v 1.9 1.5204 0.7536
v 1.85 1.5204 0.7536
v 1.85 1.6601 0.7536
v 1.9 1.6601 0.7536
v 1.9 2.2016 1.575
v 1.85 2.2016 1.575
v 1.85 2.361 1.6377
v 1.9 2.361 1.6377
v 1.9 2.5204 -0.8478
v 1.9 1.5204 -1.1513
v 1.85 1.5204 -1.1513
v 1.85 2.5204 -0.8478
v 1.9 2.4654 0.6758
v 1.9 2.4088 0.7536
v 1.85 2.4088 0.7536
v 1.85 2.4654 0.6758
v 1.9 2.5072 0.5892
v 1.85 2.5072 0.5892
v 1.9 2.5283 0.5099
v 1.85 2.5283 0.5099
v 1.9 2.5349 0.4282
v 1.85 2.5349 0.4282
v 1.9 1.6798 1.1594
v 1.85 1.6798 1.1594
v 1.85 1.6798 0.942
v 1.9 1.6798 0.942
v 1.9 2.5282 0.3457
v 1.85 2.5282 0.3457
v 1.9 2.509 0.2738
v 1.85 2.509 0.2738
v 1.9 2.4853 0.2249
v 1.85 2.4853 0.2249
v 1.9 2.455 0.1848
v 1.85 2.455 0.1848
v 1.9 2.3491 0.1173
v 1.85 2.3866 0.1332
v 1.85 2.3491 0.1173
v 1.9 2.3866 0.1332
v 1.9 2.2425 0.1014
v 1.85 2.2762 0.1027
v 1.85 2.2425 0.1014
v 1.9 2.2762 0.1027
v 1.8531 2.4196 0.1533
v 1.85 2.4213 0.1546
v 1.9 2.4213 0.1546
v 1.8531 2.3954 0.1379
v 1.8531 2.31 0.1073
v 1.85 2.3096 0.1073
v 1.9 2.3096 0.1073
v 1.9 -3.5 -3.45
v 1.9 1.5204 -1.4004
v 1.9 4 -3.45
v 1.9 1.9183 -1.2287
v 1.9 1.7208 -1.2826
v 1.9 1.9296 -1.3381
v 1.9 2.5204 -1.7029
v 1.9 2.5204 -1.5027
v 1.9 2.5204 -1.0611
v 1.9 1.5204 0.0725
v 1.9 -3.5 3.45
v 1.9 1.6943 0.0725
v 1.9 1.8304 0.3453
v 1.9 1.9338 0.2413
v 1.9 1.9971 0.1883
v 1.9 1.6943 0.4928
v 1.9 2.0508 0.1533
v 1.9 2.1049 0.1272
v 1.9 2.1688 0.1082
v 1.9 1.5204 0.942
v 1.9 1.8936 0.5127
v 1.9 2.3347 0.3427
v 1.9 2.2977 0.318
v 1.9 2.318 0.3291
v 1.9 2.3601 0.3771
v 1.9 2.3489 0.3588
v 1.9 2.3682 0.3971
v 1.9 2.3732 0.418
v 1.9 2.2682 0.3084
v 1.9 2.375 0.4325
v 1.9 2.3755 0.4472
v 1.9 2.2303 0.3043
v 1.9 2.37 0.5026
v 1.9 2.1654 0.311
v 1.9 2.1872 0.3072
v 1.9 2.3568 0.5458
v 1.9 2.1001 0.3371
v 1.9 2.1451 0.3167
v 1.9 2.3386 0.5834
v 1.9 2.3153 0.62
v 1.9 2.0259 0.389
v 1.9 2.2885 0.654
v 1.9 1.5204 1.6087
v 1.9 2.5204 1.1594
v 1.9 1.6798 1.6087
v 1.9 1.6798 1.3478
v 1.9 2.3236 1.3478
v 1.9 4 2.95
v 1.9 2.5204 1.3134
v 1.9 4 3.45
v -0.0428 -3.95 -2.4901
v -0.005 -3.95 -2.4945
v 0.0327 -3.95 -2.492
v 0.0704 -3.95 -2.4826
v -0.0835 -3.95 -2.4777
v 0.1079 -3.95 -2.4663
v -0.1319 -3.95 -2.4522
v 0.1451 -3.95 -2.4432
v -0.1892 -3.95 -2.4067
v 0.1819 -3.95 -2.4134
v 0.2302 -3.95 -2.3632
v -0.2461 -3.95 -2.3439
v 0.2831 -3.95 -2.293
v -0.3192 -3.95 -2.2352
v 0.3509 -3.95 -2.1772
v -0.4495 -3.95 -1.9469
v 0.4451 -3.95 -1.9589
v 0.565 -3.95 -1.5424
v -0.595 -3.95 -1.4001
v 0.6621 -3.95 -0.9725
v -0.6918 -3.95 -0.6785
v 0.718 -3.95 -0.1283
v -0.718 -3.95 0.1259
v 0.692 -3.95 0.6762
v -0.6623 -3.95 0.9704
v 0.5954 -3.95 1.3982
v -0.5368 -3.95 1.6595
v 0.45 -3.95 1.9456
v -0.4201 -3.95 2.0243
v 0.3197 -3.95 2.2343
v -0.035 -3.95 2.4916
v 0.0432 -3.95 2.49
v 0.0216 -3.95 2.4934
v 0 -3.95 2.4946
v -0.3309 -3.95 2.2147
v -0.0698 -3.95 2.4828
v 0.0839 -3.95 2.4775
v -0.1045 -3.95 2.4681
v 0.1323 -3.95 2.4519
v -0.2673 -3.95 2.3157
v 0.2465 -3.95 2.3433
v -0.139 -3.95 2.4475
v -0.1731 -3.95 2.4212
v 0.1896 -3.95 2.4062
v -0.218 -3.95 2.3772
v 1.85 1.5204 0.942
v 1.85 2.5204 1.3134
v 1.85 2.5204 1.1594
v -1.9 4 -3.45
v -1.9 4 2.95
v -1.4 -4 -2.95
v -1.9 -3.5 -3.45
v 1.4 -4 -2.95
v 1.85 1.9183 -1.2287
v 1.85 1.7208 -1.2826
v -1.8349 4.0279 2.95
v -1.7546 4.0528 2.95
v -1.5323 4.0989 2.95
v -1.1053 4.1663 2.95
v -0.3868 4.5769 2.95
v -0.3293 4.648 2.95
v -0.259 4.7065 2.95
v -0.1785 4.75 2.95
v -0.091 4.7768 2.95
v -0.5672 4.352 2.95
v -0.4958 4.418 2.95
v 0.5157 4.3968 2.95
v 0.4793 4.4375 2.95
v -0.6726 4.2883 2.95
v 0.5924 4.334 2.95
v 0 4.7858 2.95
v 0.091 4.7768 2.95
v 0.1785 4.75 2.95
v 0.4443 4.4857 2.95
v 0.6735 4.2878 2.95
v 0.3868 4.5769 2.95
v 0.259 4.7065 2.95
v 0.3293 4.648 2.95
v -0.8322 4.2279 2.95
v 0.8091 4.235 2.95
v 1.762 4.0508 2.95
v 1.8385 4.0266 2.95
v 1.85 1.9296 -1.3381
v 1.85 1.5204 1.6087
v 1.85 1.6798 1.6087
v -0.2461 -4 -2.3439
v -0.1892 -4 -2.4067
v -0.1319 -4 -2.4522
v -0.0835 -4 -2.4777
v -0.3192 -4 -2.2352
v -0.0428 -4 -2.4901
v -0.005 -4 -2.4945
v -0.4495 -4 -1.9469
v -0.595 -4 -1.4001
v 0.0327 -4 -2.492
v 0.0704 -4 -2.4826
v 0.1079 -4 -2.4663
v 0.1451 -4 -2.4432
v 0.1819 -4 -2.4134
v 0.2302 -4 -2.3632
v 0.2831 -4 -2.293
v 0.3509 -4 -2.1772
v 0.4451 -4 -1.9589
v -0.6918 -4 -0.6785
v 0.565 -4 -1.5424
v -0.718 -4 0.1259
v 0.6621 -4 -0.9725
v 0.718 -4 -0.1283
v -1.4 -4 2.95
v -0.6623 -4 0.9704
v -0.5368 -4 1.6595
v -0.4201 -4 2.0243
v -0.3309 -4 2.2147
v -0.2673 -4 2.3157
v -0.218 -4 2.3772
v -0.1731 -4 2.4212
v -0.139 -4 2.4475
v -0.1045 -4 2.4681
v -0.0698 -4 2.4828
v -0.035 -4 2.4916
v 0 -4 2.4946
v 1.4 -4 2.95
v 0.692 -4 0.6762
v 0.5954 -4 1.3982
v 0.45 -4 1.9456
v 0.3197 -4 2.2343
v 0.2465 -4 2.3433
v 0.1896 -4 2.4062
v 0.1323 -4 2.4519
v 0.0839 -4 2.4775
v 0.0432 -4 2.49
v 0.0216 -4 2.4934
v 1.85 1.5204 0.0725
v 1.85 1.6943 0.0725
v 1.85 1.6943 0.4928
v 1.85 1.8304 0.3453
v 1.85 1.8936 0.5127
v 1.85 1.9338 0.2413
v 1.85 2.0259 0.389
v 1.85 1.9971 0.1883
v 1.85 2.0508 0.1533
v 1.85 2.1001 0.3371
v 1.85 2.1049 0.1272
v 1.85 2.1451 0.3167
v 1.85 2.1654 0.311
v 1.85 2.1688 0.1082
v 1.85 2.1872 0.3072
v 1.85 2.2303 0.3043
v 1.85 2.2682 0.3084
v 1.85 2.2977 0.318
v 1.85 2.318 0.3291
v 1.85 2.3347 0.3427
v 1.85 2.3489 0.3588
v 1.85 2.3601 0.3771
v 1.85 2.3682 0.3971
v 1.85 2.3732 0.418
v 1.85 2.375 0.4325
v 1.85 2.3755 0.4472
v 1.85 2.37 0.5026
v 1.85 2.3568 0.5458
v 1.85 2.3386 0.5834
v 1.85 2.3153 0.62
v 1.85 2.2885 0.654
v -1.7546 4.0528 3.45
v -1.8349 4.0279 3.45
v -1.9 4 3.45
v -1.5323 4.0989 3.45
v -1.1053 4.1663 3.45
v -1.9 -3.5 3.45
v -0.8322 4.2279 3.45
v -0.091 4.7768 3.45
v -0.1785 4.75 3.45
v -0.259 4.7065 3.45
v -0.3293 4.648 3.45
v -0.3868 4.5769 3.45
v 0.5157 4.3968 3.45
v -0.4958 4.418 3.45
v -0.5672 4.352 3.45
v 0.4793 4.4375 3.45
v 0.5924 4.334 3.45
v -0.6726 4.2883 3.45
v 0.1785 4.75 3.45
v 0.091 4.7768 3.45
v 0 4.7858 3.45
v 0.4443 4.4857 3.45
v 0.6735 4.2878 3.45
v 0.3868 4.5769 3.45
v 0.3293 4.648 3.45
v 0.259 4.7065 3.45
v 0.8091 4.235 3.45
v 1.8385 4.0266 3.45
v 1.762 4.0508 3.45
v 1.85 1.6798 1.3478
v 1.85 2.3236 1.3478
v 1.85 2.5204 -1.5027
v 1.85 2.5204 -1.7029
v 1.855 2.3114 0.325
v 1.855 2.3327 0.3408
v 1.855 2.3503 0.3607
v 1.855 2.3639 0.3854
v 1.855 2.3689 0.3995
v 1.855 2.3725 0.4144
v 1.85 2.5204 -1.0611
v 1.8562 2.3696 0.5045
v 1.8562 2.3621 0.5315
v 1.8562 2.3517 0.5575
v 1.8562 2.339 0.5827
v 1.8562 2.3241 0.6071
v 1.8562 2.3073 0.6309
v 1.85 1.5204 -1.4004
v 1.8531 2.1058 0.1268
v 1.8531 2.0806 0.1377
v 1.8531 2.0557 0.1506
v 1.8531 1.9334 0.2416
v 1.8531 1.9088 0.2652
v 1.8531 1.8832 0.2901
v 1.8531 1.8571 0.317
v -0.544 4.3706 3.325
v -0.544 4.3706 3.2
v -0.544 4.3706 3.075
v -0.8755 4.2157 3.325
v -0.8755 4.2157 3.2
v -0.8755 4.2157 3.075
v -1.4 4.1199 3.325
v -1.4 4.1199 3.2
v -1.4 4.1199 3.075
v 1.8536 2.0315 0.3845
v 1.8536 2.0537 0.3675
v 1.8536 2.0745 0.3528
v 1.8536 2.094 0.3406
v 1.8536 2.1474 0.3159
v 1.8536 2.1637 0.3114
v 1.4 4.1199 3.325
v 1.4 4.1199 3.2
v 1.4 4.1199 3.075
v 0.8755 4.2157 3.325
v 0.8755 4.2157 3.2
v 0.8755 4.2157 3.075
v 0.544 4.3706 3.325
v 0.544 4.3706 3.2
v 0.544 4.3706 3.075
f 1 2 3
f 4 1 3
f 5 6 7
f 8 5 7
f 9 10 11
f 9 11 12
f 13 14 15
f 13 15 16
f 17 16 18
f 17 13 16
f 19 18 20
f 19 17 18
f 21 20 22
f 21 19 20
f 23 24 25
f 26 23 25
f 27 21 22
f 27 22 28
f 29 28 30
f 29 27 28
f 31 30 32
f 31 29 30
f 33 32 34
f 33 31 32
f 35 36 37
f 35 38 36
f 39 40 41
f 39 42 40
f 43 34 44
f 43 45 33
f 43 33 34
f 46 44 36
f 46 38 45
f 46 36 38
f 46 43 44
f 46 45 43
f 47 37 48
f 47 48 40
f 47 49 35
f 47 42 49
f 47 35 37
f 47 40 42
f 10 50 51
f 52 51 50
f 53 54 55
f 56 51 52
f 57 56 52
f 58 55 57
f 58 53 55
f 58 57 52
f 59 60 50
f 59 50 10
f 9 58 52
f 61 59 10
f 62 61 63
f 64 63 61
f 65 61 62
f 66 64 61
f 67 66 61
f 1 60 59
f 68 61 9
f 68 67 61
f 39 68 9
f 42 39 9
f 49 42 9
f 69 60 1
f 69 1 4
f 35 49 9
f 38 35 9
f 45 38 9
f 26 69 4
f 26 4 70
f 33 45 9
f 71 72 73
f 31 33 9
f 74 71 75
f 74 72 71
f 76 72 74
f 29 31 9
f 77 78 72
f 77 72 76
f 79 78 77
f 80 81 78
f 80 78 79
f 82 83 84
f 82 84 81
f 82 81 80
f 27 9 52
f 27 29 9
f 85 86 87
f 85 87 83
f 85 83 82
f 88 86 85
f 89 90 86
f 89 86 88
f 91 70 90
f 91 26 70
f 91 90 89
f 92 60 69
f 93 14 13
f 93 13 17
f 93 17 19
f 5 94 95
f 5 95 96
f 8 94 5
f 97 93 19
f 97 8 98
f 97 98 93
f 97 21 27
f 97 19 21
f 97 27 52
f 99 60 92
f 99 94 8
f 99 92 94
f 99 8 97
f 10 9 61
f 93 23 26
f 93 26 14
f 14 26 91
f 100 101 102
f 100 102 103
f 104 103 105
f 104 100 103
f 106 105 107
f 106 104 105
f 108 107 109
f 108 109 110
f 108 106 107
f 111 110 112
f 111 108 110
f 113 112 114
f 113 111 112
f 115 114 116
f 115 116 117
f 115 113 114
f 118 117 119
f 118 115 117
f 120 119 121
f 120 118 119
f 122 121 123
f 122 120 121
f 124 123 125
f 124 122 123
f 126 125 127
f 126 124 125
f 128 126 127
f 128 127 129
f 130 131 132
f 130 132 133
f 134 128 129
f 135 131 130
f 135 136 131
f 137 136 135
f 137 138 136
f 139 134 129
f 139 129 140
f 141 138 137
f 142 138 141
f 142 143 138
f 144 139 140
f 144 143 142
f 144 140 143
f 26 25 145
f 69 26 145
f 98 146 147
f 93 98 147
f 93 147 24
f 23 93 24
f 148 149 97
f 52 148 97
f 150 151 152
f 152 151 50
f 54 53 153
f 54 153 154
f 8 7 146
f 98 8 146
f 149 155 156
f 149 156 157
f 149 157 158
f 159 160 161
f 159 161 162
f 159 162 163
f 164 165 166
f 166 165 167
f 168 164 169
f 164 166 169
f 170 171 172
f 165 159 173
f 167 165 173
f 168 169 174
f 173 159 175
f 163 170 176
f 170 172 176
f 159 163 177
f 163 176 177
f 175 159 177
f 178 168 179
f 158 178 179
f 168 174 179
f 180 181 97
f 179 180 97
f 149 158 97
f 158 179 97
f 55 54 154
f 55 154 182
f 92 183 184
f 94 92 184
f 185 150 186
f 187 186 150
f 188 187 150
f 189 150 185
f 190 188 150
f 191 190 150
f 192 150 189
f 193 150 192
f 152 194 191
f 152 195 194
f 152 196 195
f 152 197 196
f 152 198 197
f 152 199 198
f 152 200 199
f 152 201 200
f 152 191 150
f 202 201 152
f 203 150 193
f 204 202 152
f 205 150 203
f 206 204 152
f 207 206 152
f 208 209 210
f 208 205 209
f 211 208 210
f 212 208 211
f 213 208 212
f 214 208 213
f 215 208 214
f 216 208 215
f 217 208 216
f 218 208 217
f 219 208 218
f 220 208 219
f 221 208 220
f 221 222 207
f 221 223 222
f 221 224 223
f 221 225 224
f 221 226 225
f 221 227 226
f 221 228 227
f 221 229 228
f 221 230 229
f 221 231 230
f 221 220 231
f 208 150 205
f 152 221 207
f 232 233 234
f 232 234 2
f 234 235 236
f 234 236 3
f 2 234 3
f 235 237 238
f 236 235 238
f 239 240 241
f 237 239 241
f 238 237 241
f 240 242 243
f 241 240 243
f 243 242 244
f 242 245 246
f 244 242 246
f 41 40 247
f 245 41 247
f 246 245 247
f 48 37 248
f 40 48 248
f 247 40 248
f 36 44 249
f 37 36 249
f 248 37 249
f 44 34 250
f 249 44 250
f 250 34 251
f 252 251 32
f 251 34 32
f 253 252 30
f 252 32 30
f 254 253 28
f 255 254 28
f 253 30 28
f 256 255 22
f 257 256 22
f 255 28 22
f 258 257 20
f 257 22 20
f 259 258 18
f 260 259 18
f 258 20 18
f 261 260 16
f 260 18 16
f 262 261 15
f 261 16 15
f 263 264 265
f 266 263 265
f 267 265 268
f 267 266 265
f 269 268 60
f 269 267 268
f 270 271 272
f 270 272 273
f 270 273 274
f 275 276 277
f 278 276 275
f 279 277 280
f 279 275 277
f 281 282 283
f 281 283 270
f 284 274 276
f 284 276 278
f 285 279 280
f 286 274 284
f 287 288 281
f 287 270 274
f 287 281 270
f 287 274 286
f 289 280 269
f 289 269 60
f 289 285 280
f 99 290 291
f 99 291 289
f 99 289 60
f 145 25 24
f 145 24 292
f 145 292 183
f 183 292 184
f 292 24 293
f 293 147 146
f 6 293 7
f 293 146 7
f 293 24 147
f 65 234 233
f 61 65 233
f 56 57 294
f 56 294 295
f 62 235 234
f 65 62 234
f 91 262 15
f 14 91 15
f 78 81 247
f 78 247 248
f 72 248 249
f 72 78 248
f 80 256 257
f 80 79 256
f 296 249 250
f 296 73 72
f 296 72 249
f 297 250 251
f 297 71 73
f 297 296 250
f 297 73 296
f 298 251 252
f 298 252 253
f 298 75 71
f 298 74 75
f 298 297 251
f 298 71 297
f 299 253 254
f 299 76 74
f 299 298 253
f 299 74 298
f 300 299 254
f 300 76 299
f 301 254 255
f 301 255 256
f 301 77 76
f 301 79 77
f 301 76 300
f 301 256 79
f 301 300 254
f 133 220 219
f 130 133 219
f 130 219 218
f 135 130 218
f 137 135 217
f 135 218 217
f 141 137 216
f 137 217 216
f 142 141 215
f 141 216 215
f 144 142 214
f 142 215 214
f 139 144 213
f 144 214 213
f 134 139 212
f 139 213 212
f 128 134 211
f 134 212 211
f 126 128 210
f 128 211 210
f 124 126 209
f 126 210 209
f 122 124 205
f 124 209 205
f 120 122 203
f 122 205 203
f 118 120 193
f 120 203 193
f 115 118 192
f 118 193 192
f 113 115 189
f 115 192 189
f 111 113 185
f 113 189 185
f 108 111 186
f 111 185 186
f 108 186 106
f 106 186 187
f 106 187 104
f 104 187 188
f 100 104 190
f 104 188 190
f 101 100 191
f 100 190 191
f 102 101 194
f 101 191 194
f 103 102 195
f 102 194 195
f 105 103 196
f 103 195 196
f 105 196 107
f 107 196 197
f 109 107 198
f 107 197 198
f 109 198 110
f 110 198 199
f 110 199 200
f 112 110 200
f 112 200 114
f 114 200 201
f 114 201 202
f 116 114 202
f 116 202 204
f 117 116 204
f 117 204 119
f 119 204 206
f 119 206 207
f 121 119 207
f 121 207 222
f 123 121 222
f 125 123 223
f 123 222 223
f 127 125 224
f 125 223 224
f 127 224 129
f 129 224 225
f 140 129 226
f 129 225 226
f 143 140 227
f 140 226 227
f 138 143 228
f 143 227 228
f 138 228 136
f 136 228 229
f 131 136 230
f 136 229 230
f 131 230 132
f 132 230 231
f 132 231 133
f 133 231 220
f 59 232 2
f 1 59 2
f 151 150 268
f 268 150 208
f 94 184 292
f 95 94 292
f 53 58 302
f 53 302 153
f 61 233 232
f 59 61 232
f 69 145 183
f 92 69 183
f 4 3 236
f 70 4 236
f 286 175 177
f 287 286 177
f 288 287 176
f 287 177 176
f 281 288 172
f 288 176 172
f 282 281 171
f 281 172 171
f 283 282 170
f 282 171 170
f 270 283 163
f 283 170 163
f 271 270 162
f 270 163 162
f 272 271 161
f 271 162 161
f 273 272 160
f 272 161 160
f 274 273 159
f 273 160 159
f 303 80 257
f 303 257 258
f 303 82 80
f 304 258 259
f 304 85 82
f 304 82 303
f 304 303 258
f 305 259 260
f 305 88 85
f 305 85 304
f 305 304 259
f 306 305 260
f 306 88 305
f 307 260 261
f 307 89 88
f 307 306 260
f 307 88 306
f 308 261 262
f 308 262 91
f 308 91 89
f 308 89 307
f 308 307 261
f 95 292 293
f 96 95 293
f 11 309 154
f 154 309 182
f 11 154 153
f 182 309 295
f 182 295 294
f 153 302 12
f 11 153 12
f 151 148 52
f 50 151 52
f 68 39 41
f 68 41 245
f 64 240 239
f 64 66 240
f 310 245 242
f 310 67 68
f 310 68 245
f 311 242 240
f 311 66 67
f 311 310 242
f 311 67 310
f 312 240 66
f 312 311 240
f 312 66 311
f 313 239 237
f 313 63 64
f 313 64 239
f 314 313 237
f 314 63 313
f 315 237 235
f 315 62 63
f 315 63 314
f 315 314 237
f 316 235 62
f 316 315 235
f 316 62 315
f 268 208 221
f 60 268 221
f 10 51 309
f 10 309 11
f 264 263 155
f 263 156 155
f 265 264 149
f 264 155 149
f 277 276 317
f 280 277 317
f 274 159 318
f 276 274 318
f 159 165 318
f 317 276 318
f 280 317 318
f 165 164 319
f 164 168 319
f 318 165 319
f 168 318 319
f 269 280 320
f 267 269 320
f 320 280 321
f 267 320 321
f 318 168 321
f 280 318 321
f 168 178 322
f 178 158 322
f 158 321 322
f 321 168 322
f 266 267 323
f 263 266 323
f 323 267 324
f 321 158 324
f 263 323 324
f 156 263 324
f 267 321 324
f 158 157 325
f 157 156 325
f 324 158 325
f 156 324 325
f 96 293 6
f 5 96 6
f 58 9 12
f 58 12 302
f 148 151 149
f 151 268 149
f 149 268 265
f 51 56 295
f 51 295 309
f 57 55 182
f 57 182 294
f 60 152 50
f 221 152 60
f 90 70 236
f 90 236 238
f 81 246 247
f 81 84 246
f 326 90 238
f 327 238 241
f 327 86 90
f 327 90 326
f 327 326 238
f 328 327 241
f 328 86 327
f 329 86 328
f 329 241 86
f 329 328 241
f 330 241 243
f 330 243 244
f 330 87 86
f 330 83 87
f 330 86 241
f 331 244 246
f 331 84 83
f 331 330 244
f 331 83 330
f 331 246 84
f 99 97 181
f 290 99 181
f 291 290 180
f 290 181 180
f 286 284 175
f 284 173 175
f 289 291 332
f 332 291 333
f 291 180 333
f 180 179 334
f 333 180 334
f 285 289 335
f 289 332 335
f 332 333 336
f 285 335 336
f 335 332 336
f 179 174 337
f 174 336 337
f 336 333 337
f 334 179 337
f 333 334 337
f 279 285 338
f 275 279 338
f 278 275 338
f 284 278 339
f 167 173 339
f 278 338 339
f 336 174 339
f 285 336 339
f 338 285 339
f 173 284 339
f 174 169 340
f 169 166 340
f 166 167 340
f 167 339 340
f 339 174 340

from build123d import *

# Parameters (mm, degrees)
SKETCH1_W           = 3.8
SKETCH1_H           = 8
BOSS_EXTRUDE1_DEPTH = 3.45
BOSS_EXTRUDE3_START = -0.5
BOSS_EXTRUDE3_DEPTH = 0.5
CHAMFER2_SIZE       = 0.5
SKETCH8_RX          = 2.494560644
SKETCH8_RY          = 0.718935273
CUT_EXTRUDE2_DEPTH  = 0.05
CUT_EXTRUDE3_DEPTH  = 0.05


# Read off the part's stored shape, not the designer's step: Boss-Extrude3
with BuildPart() as part:
    # Sketch1 → Boss-Extrude1 (new, symmetric)
    with BuildSketch(Plane.XY):
        Rectangle(SKETCH1_W, SKETCH1_H)
    extrude(amount=BOSS_EXTRUDE1_DEPTH, both=True)

    # Boss-Extrude3 outline → Boss-Extrude3 (add)
    with BuildSketch(Plane.XY.offset(3.45).offset(BOSS_EXTRUDE3_START)):
        with BuildLine():
            ThreePointArc((0.386782268, 4.576881383), (0, 4.785801899), (-0.386782268, 4.576881383))
            add(Edge.make_bspline(
                [(-0.386782268, 4.576881383), (-0.522104533, 4.370469494), (-0.576485167, 4.110258291), (-1.543568904, 4.182658763), (-1.9, 4)],
                knots=[0, 0, 0, 0, 0, 1, 1, 1, 1, 1], degree=4))
            Line((-1.9, 4), (1.9, 4))
            add(Edge.make_bspline(
                [(1.9, 4), (1.543568904, 4.182658763), (0.576485167, 4.110258291), (0.522104533, 4.370469494), (0.386782268, 4.576881383)],
                knots=[0, 0, 0, 0, 0, 1, 1, 1, 1, 1], degree=4))
        make_face()
    extrude(amount=BOSS_EXTRUDE3_DEPTH)

    # Chamfer2
    chamfer2_edges = [part.edges().sort_by_distance(p)[0] for p in [
        (0, -4, 3.45),
        (0, -4, -3.45),
        (1.9, -4, 0),
        (-1.9, -4, 0),
    ]]
    chamfer(chamfer2_edges, length=CHAMFER2_SIZE)

    # Sketch8 → Cut-Extrude2 (cut, symmetric)
    with BuildSketch(Plane.XZ.offset(4)):
        with Locations(Location((0, 0), (0, 0, 90))):
            Ellipse(SKETCH8_RX, SKETCH8_RY)
    extrude(amount=CUT_EXTRUDE2_DEPTH, both=True, mode=Mode.SUBTRACT)

    # Sketch9 → Cut-Extrude3 (cut, symmetric)
    with BuildSketch(Plane(origin=(1.9, 0, 0), x_dir=(0, 0, -1), z_dir=(1, 0, 0))):
        Polygon((-1.608695652, 1.52039879), (-1.608695652, 1.67981908), (-1.347826087, 1.67981908), (-1.347826087, 2.32361437), (-1.57495471, 2.20155821), (-1.637681159, 2.3609785), (-1.313405797, 2.52039879), (-1.15942029, 2.52039879), (-1.15942029, 1.67981908), (-0.942028986, 1.67981908), (-0.942028986, 1.52039879), align=None)
        with BuildLine():
            Line((-0.753623188, 1.52039879), (-0.753623188, 1.660117993))
            Line((-0.753623188, 1.660117993), (-0.512681159, 1.893587196))
            add(Edge.make_bspline(
                [(-0.512681159, 1.893587196), (-0.5018156, 1.904159463), (-0.481039355, 1.924374897), (-0.452427524, 1.954418318), (-0.426714142, 1.981714894), (-0.404257947, 2.007005685), (-0.384911278, 2.030762388), (-0.367887318, 2.052940622), (-0.35307316, 2.073689639), (-0.340721742, 2.093374099), (-0.330364569, 2.111983404), (-0.322256202, 2.129907311), (-0.31575837, 2.146967443), (-0.309698908, 2.168941676), (-0.305493732, 2.196715837), (-0.304731855, 2.219056371), (-0.304347826, 2.230317268)],
                knots=[0, 0, 0, 0, 1.561346149, 2.985479849, 4.272660798, 5.42387168, 6.4681479, 7.427594435, 8.303382019, 9.092890023, 9.820107477, 10.495077279, 11.117492523, 11.698467986, 12.839897307, 14, 14, 14, 14], degree=3))
            add(Edge.make_bspline(
                [(-0.304347826, 2.230317268), (-0.304749324, 2.239951277), (-0.305544487, 2.259031359), (-0.312869331, 2.286419819), (-0.32389769, 2.31167432), (-0.340192786, 2.333284373), (-0.360528944, 2.351500926), (-0.381140537, 2.36269725), (-0.399534406, 2.369207499), (-0.414564764, 2.372786302), (-0.430554514, 2.375179437), (-0.44156686, 2.375372066), (-0.447237319, 2.375471254)],
                knots=[0, 0, 0, 0, 1.259052347, 2.493543675, 3.687736162, 4.846054809, 6.008246034, 7.237941048, 7.888132915, 8.5593184, 9.258166694, 10, 10, 10, 10], degree=3))
            add(Edge.make_bspline(
                [(-0.447237319, 2.375471254), (-0.456988906, 2.375134553), (-0.476209579, 2.374470906), (-0.504504735, 2.370167962), (-0.531680703, 2.362610737), (-0.557705297, 2.352017107), (-0.583009083, 2.339296512), (-0.607369703, 2.324204601), (-0.631341549, 2.307520425), (-0.646378777, 2.294899268), (-0.653985507, 2.288514732)],
                knots=[0, 0, 0, 0, 1.020414048, 2.011267059, 2.986668027, 3.96497488, 4.94697347, 5.946696085, 6.961316025, 8, 8, 8, 8], degree=3))
            Line((-0.653985507, 2.288514732), (-0.753623188, 2.408759297))
            add(Edge.make_bspline(
                [(-0.753623188, 2.408759297), (-0.742518604, 2.418001221), (-0.72030534, 2.436488477), (-0.68431817, 2.460977212), (-0.646234813, 2.482437605), (-0.606269993, 2.50111137), (-0.564434736, 2.516559351), (-0.520470754, 2.52692615), (-0.474936737, 2.533905774), (-0.443942977, 2.534559711), (-0.42821558, 2.534891543)],
                knots=[0, 0, 0, 0, 0.971414743, 1.943187718, 2.923163908, 3.90905488, 4.908116413, 5.916732171, 6.942871654, 8, 8, 8, 8], degree=3))
            add(Edge.make_bspline(
                [(-0.42821558, 2.534891543), (-0.416203685, 2.534703898), (-0.392650983, 2.534335966), (-0.358220001, 2.530579803), (-0.325504013, 2.524775686), (-0.294589327, 2.516626165), (-0.265532929, 2.506251119), (-0.2384809, 2.493601472), (-0.213635967, 2.478599538), (-0.191054535, 2.461304731), (-0.17078899, 2.441689013), (-0.15269922, 2.419840212), (-0.137363523, 2.395482265), (-0.124395242, 2.368994948), (-0.113833889, 2.340452893), (-0.106835404, 2.309612456), (-0.102028057, 2.27681502), (-0.101645917, 2.254188651), (-0.101449275, 2.242545529)],
                knots=[0, 0, 0, 0, 1.159472778, 2.273472863, 3.340013536, 4.365414322, 5.356781803, 6.31537468, 7.244130825, 8.153815157, 9.055875647, 9.962049253, 10.886103095, 11.828148954, 12.805810483, 13.817047342, 14.876691883, 16, 16, 16, 16], degree=3))
            add(Edge.make_bspline(
                [(-0.101449275, 2.242545529), (-0.101573271, 2.232797158), (-0.10181811, 2.213548196), (-0.105266832, 2.185201632), (-0.109988074, 2.157717091), (-0.117468921, 2.131299919), (-0.126556111, 2.105586764), (-0.13745779, 2.08027856), (-0.150492092, 2.055452632), (-0.164982926, 2.030681159), (-0.181295483, 2.006109055), (-0.19988108, 1.981983737), (-0.219700719, 1.957357861), (-0.241779881, 1.933018624), (-0.265556322, 1.908393081), (-0.290302007, 1.882559449), (-0.317355297, 1.856767431), (-0.335891122, 1.839304984), (-0.345335145, 1.830407848)],
                knots=[0, 0, 0, 0, 0.945736526, 1.867434716, 2.768631143, 3.650402628, 4.528787893, 5.414963327, 6.32280855, 7.249039709, 8.200182995, 9.183579422, 10.204429958, 11.268168642, 12.372135405, 13.527717836, 14.740369513, 16, 16, 16, 16], degree=3))
            Line((-0.345335145, 1.830407848), (-0.492753623, 1.694311833))
            Line((-0.492753623, 1.694311833), (-0.072463768, 1.694311833))
            Line((-0.072463768, 1.694311833), (-0.072463768, 1.52039879))
            Line((-0.072463768, 1.52039879), (-0.753623188, 1.52039879))
        make_face()
        Polygon((1.400362319, 1.52039879), (1.151268116, 1.52039879), (0.847826087, 2.52039879), (1.061141304, 2.52039879), (1.228713768, 1.918270167), (1.282608696, 1.720806399), (1.338088768, 1.92959263), (1.502717391, 2.52039879), (1.702898551, 2.52039879), align=None)
    extrude(amount=CUT_EXTRUDE3_DEPTH, both=True, mode=Mode.SUBTRACT)


solid = part.part
